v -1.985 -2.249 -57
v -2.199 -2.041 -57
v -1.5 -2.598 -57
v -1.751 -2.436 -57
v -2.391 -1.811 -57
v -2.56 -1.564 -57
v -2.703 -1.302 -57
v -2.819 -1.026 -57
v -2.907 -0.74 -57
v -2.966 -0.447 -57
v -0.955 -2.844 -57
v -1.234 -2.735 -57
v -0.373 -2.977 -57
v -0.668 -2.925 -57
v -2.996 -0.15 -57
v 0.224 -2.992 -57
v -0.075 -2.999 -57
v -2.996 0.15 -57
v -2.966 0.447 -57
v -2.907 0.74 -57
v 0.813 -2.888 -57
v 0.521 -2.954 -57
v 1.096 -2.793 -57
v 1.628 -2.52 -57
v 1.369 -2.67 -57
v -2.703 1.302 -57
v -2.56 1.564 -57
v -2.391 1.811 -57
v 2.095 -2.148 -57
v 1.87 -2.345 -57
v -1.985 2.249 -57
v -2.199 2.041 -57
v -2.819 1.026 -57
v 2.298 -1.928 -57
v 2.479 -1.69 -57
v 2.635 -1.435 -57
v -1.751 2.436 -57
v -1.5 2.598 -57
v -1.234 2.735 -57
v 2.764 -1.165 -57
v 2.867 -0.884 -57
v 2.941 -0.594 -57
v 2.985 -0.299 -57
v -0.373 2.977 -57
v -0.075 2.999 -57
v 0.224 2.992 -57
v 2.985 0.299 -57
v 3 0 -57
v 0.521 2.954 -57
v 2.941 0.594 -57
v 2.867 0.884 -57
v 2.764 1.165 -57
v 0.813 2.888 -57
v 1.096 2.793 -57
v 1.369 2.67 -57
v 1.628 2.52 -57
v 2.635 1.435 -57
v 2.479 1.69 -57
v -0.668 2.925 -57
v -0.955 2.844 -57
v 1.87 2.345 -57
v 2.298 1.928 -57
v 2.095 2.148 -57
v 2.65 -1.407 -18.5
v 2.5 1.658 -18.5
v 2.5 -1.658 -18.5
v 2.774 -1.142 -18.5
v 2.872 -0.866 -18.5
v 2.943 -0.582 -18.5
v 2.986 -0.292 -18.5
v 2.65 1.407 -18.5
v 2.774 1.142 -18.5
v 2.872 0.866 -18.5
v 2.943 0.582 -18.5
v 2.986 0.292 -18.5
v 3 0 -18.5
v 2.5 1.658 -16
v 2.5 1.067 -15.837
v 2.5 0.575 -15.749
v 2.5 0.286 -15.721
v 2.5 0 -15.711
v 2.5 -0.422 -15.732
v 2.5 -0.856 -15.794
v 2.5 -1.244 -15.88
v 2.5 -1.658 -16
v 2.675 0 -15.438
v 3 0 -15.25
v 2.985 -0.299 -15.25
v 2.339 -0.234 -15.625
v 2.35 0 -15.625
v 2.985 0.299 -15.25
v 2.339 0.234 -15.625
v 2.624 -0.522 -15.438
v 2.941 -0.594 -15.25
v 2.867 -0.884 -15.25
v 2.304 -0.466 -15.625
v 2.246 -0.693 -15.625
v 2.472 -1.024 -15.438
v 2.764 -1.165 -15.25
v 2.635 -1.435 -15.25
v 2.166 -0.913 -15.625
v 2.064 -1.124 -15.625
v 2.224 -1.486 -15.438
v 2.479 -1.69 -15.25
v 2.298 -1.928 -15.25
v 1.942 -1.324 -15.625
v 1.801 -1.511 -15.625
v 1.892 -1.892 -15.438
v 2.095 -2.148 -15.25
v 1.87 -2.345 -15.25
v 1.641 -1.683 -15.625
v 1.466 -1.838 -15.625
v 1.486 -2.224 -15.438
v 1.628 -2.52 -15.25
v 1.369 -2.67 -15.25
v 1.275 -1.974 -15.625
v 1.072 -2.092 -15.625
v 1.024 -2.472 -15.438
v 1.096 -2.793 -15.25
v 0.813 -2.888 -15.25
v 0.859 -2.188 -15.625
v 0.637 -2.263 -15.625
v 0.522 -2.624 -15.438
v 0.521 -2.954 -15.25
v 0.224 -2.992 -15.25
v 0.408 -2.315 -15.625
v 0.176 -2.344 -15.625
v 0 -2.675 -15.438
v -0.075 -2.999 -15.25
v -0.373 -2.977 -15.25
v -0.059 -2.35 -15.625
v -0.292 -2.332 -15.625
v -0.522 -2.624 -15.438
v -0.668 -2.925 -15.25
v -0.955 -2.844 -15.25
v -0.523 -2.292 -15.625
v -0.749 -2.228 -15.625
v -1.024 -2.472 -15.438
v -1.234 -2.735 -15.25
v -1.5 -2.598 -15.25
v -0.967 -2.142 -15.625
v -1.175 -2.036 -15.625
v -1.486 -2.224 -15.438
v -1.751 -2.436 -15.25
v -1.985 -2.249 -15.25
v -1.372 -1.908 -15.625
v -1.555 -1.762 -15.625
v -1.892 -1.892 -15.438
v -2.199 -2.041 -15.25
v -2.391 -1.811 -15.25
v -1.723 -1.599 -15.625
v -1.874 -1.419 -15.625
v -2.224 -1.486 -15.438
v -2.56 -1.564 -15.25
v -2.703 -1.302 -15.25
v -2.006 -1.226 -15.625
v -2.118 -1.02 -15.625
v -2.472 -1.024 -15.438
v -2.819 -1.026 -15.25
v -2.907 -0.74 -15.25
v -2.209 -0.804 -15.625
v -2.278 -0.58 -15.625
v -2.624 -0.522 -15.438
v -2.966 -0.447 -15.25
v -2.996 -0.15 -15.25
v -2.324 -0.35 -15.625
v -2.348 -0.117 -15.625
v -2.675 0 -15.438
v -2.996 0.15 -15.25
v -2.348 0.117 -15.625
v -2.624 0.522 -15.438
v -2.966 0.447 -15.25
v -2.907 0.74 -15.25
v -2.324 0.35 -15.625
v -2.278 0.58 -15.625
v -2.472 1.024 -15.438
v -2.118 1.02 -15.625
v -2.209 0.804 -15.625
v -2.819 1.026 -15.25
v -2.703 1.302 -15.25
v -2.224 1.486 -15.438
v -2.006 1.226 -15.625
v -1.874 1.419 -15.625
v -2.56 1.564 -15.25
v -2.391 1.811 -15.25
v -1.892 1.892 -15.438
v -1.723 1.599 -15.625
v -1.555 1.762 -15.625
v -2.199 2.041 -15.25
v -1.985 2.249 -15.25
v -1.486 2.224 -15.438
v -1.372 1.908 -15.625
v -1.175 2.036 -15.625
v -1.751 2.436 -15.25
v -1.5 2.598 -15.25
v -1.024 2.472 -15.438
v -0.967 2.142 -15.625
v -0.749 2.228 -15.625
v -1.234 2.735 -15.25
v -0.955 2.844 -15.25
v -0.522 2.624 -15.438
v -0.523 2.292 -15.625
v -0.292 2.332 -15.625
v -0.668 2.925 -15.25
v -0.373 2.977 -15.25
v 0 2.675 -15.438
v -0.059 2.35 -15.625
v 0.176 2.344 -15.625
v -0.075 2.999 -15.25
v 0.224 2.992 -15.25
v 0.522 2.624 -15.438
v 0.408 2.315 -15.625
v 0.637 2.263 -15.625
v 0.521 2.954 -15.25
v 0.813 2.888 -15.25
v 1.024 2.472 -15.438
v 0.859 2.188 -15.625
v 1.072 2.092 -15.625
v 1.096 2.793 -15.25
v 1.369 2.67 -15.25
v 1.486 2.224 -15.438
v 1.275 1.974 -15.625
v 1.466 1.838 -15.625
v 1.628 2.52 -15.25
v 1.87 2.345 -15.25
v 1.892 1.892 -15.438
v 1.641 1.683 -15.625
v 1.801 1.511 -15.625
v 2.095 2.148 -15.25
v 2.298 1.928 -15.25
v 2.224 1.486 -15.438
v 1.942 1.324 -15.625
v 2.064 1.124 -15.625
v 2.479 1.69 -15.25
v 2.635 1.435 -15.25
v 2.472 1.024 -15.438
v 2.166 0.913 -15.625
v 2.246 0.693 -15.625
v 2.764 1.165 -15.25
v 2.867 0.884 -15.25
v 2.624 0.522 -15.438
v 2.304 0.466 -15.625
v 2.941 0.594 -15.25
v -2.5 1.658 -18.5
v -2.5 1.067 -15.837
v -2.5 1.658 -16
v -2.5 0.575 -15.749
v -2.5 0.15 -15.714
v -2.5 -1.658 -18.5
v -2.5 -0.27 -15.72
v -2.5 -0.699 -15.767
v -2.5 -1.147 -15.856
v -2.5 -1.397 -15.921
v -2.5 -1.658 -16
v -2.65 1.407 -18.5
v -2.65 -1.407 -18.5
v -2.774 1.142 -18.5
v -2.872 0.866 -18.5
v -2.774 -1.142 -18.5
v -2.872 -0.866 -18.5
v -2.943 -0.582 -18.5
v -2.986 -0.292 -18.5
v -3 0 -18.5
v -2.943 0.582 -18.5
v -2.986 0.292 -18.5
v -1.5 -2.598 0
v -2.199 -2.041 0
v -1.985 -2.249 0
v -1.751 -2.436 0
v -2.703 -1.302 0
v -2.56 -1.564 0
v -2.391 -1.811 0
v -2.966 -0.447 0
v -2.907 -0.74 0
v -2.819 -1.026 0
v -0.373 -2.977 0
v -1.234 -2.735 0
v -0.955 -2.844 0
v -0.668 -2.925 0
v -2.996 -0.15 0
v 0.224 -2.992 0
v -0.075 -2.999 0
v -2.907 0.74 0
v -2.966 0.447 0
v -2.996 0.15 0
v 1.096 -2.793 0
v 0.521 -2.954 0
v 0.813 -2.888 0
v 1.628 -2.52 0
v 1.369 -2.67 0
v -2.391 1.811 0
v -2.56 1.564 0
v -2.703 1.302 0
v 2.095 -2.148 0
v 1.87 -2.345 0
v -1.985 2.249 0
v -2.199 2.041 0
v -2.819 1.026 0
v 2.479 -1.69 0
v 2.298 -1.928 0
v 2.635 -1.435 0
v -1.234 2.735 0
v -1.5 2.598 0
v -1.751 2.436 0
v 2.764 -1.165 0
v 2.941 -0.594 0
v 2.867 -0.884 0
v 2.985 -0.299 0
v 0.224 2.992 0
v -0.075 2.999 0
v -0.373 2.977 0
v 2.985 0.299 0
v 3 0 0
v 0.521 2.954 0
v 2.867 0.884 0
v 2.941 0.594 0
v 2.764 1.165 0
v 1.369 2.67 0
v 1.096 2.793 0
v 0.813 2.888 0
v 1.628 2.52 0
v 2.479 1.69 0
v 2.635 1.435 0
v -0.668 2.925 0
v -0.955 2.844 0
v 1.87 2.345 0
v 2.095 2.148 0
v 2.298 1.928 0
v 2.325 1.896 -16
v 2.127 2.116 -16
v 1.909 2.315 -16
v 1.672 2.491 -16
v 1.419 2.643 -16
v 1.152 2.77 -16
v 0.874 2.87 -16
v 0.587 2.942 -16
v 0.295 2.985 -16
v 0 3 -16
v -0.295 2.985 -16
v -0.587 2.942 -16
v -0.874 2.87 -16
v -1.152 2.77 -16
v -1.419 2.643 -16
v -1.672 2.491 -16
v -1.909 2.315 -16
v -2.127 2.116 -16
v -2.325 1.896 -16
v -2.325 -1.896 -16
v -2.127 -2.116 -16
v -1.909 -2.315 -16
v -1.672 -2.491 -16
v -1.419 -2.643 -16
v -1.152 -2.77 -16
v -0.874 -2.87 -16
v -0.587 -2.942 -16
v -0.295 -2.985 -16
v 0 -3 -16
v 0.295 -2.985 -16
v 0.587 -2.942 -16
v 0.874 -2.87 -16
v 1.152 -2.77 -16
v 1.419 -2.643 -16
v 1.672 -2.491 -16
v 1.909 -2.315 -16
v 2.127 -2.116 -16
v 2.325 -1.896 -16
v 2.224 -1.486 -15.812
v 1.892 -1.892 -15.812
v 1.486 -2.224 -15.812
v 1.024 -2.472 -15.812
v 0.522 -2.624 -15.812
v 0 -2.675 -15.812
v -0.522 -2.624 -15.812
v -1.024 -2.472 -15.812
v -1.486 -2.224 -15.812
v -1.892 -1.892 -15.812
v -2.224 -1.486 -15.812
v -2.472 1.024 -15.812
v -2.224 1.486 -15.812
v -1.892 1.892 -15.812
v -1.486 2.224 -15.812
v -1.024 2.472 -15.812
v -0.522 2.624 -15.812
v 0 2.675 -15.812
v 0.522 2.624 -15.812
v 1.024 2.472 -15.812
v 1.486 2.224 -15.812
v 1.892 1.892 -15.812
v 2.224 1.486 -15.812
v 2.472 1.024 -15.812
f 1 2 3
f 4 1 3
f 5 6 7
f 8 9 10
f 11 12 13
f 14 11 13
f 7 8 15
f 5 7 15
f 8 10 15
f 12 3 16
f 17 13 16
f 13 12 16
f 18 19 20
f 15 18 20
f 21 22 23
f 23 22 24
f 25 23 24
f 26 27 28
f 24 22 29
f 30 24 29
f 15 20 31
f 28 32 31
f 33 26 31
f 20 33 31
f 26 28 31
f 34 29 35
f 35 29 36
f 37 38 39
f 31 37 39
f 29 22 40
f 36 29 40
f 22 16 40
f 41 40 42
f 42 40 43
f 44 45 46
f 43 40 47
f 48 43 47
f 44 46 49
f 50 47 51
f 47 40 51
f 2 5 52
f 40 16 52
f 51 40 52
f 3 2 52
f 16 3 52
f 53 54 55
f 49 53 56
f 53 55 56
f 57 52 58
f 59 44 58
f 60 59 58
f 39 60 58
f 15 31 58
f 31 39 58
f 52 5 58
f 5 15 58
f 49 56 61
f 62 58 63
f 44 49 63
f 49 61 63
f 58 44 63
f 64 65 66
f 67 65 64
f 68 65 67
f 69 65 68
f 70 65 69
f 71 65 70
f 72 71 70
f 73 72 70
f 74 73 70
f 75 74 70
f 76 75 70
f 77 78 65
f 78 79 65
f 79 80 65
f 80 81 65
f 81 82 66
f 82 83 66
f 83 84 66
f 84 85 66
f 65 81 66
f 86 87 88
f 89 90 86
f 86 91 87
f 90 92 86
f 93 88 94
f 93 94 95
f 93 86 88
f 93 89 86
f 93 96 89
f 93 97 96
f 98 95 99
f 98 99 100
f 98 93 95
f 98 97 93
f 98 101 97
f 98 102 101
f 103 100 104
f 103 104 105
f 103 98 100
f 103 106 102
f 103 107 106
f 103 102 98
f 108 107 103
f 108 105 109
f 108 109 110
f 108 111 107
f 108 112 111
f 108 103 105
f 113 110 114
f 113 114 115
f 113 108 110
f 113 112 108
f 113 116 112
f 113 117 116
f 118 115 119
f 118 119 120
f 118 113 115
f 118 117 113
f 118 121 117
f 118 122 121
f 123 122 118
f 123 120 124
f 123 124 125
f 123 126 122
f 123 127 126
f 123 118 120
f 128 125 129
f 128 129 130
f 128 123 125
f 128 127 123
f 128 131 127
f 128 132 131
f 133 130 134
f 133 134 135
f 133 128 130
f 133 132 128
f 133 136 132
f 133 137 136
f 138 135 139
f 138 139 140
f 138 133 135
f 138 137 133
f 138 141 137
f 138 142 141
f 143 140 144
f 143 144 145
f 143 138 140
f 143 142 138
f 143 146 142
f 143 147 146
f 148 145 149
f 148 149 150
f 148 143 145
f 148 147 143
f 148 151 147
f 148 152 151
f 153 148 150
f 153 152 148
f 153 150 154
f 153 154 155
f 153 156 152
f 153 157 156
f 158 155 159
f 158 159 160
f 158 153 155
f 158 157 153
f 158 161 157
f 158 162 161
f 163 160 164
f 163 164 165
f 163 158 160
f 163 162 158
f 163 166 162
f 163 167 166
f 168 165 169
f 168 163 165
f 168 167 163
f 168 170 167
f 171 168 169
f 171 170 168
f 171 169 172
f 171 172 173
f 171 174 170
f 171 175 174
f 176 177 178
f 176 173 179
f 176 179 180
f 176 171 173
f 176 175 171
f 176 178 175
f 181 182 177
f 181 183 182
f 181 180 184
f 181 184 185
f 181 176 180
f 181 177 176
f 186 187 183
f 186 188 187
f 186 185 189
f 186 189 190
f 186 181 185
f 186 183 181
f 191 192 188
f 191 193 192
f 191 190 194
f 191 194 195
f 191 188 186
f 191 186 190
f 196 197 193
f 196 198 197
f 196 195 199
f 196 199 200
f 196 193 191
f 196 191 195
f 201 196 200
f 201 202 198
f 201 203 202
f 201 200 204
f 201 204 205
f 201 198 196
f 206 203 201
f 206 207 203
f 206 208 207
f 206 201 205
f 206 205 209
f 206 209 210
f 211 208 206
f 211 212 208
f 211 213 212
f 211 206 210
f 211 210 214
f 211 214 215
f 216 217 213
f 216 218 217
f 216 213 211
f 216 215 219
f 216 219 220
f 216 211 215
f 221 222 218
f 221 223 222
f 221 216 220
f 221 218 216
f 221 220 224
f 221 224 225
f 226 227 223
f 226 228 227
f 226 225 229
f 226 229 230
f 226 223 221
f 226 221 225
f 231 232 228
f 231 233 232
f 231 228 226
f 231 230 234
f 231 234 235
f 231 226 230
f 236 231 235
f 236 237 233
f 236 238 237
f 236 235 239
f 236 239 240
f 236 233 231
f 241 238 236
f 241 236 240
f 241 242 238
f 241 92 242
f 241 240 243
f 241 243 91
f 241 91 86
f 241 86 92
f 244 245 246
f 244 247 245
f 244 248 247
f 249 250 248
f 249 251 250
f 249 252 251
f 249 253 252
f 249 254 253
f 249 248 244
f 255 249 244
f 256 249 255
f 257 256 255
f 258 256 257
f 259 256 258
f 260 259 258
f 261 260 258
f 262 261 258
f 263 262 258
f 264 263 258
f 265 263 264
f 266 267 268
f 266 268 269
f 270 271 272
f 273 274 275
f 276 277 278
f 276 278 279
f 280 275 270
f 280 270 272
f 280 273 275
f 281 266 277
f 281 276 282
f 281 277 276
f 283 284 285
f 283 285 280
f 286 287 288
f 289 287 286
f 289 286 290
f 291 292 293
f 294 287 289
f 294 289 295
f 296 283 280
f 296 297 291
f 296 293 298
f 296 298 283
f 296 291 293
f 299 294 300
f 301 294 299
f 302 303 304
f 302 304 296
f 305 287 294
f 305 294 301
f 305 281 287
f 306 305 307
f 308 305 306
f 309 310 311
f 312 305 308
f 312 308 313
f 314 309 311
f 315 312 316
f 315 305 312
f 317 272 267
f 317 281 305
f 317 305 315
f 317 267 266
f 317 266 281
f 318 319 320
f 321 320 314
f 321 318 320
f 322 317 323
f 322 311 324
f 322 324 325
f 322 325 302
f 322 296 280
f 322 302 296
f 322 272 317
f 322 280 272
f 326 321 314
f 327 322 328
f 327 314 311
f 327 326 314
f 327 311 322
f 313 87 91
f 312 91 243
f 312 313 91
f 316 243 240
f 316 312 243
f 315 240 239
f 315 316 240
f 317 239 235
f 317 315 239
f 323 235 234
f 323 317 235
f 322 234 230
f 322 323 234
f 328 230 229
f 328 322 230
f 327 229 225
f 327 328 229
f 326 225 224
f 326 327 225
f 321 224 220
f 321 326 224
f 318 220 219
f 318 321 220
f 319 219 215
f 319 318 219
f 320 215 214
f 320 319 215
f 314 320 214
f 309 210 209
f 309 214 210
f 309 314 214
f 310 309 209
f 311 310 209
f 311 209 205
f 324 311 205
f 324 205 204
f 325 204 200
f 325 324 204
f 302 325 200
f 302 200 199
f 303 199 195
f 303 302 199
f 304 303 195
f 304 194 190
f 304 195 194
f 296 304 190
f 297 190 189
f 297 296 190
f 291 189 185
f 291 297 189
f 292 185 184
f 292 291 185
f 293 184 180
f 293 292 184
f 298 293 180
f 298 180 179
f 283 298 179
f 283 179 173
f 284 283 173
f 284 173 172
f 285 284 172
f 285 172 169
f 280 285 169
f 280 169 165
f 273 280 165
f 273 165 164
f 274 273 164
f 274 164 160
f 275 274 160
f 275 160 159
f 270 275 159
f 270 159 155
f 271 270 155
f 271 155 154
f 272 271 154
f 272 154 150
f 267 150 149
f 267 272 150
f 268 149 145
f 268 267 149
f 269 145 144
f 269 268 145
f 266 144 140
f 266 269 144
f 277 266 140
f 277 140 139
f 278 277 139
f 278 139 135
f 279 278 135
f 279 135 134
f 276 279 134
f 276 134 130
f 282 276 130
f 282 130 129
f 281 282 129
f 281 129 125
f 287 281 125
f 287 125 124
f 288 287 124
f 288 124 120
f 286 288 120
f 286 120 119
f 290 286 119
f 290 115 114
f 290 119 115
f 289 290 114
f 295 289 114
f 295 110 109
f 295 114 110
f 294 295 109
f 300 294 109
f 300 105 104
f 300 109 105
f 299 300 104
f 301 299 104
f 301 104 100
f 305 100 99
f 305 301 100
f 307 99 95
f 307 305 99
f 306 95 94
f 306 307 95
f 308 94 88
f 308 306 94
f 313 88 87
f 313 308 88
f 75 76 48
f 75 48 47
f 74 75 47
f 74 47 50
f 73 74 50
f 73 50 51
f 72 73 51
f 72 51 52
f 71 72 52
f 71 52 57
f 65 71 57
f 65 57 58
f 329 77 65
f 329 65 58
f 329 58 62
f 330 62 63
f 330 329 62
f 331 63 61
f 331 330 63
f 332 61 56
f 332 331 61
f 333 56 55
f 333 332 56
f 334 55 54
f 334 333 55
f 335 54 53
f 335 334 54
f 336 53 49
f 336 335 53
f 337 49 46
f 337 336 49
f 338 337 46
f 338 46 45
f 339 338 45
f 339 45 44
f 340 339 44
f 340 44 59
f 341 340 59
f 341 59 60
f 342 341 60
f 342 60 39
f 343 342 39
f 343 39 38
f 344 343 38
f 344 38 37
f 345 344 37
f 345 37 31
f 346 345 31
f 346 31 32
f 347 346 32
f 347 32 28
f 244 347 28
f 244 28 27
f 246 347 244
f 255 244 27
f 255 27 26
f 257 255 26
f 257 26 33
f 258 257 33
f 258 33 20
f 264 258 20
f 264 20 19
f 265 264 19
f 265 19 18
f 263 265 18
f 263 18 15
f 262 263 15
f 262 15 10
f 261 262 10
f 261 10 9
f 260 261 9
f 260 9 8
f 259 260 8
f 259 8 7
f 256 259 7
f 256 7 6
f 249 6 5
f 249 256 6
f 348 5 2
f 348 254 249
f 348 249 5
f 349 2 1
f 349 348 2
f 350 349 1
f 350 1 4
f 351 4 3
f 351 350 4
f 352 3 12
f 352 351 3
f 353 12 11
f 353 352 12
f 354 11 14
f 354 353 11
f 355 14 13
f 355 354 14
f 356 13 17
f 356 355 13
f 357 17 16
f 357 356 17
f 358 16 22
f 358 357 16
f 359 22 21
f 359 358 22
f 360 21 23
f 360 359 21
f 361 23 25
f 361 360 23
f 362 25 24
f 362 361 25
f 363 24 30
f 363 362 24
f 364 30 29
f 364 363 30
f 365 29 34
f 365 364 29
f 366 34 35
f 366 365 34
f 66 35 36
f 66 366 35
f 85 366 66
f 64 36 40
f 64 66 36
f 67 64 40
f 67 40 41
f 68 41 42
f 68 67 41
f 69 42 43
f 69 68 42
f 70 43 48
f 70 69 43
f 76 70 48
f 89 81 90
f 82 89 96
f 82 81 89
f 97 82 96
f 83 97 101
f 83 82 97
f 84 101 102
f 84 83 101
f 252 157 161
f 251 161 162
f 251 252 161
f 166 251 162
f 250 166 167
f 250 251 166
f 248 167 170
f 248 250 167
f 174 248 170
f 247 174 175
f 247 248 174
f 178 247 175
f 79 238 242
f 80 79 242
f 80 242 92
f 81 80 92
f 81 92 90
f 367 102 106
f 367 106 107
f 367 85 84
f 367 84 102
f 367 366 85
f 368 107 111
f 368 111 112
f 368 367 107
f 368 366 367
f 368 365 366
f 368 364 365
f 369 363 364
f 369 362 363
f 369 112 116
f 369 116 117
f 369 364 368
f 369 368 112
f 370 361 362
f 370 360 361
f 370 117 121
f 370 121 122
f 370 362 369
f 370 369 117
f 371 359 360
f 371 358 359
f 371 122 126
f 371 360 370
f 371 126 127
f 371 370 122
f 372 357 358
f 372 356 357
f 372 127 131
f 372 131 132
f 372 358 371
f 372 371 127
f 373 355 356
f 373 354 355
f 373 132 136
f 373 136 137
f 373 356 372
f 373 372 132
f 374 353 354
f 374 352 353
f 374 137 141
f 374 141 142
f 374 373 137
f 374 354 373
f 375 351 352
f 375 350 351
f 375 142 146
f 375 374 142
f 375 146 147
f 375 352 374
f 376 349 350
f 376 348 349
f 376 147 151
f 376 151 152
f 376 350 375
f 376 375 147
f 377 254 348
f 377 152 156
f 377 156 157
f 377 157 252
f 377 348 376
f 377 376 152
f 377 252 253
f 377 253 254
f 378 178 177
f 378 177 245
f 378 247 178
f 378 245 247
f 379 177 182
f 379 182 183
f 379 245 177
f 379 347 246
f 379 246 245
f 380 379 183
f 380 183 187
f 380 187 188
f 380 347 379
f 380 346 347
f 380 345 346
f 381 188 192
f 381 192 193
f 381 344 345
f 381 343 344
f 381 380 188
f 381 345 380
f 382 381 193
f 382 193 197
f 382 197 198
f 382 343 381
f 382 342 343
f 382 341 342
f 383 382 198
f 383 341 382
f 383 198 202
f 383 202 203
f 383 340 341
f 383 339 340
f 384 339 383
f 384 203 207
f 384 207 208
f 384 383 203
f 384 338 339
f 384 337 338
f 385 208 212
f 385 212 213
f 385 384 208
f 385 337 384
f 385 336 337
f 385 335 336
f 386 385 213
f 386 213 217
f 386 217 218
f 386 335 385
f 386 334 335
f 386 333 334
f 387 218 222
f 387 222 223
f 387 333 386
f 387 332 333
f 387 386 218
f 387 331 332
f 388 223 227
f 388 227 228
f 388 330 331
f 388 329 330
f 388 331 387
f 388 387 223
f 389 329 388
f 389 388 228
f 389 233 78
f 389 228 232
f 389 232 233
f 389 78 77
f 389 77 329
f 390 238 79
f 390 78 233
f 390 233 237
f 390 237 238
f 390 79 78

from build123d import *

# Parameters (mm, degrees)
SKETCH3_R          = 3
BODY_DEPTH         = 57
CUT_KEY_DEPTH      = 58.15767665
CUT_KEY_DEPTH_BACK = 58.15767665
SKETCH7_W          = 2.875
SKETCH7_H          = 2.875


with BuildPart() as part:
    # Sketch3 → body (new body)
    with BuildSketch(Plane.XY):
        Circle(SKETCH3_R)
    extrude(amount=-BODY_DEPTH)

    # Sketch5 → cut-thread (revolve, cut)
    with BuildSketch(Plane(origin=(0, 0, 0), x_dir=(0, 0, -1), z_dir=(1, 0, 0)), mode=Mode.PRIVATE) as cut_thread_sk:
        Polygon((15.625, 2.350480947), (16, 3), (16, 5.821231691), (0, 5.821231691), (0, 3), (15.25, 3), align=None)
    revolve(cut_thread_sk.sketch.rotate(Axis((0, 0, 0), (0, 0, -1)), 90), axis=Axis((0, 0, 0), (0, 0, -1)), mode=Mode.SUBTRACT)

    # Sketch7 → cut-key (cut, two sides: drawn at the far end of the back side and taken through both)
    with BuildSketch(Plane(origin=(0, 0, 0), x_dir=(1, 0, 0), z_dir=(0, 1, 0)).offset(-CUT_KEY_DEPTH_BACK)):
        with Locations((3.9375, 17.0625)):
            Rectangle(SKETCH7_W, SKETCH7_H)
        with Locations((-3.9375, 17.0625)):
            Rectangle(SKETCH7_W, SKETCH7_H)
    extrude(amount=CUT_KEY_DEPTH + CUT_KEY_DEPTH_BACK, mode=Mode.SUBTRACT)


solid = part.part
